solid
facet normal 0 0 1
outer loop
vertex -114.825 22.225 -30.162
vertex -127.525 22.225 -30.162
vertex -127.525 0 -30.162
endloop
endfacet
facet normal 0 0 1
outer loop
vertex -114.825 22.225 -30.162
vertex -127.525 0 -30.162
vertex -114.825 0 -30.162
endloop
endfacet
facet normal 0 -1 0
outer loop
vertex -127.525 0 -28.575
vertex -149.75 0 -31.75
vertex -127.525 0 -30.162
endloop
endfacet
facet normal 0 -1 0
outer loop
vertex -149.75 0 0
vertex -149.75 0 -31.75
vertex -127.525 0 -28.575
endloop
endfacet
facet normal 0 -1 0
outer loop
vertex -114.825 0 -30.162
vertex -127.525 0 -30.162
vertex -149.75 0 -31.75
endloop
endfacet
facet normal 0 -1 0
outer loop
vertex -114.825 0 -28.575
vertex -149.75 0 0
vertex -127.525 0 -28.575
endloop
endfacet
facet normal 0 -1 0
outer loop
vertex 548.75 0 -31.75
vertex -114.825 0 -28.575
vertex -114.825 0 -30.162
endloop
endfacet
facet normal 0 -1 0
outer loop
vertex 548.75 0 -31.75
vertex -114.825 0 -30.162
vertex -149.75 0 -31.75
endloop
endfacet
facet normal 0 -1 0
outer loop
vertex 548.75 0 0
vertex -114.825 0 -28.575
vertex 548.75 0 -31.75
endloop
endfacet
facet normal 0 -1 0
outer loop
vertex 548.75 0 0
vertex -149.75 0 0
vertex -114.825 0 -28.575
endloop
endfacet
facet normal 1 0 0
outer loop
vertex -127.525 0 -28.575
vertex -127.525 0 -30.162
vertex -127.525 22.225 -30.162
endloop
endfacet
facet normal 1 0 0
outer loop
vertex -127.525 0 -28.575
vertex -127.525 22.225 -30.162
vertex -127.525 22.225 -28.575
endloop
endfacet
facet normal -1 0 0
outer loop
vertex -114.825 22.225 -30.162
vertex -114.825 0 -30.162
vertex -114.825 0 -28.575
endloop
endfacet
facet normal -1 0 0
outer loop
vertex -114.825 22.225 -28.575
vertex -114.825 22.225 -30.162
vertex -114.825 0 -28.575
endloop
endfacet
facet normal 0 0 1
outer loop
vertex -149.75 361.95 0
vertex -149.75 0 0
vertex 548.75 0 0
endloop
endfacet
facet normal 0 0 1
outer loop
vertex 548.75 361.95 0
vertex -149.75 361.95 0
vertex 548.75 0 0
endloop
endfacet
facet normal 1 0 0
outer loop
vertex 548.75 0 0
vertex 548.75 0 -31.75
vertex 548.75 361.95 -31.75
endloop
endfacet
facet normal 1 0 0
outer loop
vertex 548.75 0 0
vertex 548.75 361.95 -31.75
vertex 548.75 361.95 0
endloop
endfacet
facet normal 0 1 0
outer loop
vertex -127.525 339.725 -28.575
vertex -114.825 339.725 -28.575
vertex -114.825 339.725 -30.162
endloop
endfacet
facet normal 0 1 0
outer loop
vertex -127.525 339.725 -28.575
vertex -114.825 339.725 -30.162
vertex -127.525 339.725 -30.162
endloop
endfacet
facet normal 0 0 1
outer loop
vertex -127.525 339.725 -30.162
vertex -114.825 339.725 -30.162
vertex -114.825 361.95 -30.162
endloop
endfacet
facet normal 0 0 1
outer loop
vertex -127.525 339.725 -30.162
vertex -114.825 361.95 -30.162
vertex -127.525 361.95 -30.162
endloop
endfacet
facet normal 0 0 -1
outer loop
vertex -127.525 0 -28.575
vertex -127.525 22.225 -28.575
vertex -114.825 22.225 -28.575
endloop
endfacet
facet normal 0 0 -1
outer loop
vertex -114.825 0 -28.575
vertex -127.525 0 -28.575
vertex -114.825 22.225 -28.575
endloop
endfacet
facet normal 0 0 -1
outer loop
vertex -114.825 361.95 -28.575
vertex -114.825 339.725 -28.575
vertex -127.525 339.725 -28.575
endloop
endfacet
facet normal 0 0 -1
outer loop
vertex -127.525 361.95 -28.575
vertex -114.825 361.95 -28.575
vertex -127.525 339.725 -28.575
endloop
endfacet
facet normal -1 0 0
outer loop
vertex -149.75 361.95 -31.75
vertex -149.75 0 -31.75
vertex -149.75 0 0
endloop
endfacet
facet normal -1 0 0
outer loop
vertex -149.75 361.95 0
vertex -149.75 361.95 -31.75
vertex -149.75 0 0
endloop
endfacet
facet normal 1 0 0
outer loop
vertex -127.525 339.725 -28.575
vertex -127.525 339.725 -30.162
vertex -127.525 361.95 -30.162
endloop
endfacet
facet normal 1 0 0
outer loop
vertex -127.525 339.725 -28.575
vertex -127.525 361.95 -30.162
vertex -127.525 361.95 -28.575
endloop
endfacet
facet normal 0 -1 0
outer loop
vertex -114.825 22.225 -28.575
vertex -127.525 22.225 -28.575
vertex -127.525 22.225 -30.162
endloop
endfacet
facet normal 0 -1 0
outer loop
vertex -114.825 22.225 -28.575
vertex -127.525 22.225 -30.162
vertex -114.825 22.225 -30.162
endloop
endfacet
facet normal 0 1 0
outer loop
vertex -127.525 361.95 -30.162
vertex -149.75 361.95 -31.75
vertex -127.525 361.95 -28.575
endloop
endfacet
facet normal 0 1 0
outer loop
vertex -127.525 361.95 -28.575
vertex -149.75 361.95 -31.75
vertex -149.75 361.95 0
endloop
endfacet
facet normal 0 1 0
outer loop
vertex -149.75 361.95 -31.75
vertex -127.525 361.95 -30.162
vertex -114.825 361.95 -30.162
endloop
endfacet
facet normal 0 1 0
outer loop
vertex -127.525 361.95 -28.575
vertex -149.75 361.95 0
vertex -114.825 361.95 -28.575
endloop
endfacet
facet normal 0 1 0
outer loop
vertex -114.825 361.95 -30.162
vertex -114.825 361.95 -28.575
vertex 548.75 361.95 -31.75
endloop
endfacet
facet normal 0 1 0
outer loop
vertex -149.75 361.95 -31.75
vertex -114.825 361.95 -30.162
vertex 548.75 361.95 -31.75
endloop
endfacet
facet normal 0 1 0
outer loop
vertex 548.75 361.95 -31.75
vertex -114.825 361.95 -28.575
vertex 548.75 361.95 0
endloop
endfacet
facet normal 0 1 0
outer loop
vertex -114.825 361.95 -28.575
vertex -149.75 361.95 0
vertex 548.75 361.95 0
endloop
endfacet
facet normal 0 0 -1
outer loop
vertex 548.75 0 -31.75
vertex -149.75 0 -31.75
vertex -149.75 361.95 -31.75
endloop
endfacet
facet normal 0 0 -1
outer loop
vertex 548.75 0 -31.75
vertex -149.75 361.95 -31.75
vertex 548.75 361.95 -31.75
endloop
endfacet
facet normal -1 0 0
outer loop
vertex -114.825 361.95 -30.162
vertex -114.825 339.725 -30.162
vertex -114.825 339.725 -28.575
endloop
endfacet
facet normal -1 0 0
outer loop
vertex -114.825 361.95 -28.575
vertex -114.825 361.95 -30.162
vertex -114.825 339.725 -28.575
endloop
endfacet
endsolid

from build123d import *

# Parameters (mm, degrees)
F0_W     = 698.5
F0_H     = 31.75
F1_DEPTH = 361.95
F2_W     = 12.7
F2_H     = 1.5875
F3_DEPTH = 22.225
F4_W     = 12.7
F4_H     = 1.5875
F5_DEPTH = 22.225


with BuildPart() as f1:
    # F0 (on Front) → F1 (new body)
    with BuildSketch(Plane.XZ):
        with Locations((199.500215, -15.875)):
            Rectangle(F0_W, F0_H)
    extrude(amount=-F1_DEPTH)

    # F2 (on face) → F3 (cut)
    with BuildSketch(Plane.XZ):
        with Locations((-121.174785, -29.36875)):
            Rectangle(F2_W, F2_H)
    extrude(amount=-F3_DEPTH, mode=Mode.SUBTRACT)

    # F4 (on face) → F5 (cut)
    with BuildSketch(Plane(origin=(0, 361.95, 0), x_dir=(-1, 0, 0), z_dir=(0, 1, 0))):
        with Locations((121.174785, -29.36875)):
            Rectangle(F4_W, F4_H)
    extrude(amount=-F5_DEPTH, mode=Mode.SUBTRACT)


solid = f1.part
